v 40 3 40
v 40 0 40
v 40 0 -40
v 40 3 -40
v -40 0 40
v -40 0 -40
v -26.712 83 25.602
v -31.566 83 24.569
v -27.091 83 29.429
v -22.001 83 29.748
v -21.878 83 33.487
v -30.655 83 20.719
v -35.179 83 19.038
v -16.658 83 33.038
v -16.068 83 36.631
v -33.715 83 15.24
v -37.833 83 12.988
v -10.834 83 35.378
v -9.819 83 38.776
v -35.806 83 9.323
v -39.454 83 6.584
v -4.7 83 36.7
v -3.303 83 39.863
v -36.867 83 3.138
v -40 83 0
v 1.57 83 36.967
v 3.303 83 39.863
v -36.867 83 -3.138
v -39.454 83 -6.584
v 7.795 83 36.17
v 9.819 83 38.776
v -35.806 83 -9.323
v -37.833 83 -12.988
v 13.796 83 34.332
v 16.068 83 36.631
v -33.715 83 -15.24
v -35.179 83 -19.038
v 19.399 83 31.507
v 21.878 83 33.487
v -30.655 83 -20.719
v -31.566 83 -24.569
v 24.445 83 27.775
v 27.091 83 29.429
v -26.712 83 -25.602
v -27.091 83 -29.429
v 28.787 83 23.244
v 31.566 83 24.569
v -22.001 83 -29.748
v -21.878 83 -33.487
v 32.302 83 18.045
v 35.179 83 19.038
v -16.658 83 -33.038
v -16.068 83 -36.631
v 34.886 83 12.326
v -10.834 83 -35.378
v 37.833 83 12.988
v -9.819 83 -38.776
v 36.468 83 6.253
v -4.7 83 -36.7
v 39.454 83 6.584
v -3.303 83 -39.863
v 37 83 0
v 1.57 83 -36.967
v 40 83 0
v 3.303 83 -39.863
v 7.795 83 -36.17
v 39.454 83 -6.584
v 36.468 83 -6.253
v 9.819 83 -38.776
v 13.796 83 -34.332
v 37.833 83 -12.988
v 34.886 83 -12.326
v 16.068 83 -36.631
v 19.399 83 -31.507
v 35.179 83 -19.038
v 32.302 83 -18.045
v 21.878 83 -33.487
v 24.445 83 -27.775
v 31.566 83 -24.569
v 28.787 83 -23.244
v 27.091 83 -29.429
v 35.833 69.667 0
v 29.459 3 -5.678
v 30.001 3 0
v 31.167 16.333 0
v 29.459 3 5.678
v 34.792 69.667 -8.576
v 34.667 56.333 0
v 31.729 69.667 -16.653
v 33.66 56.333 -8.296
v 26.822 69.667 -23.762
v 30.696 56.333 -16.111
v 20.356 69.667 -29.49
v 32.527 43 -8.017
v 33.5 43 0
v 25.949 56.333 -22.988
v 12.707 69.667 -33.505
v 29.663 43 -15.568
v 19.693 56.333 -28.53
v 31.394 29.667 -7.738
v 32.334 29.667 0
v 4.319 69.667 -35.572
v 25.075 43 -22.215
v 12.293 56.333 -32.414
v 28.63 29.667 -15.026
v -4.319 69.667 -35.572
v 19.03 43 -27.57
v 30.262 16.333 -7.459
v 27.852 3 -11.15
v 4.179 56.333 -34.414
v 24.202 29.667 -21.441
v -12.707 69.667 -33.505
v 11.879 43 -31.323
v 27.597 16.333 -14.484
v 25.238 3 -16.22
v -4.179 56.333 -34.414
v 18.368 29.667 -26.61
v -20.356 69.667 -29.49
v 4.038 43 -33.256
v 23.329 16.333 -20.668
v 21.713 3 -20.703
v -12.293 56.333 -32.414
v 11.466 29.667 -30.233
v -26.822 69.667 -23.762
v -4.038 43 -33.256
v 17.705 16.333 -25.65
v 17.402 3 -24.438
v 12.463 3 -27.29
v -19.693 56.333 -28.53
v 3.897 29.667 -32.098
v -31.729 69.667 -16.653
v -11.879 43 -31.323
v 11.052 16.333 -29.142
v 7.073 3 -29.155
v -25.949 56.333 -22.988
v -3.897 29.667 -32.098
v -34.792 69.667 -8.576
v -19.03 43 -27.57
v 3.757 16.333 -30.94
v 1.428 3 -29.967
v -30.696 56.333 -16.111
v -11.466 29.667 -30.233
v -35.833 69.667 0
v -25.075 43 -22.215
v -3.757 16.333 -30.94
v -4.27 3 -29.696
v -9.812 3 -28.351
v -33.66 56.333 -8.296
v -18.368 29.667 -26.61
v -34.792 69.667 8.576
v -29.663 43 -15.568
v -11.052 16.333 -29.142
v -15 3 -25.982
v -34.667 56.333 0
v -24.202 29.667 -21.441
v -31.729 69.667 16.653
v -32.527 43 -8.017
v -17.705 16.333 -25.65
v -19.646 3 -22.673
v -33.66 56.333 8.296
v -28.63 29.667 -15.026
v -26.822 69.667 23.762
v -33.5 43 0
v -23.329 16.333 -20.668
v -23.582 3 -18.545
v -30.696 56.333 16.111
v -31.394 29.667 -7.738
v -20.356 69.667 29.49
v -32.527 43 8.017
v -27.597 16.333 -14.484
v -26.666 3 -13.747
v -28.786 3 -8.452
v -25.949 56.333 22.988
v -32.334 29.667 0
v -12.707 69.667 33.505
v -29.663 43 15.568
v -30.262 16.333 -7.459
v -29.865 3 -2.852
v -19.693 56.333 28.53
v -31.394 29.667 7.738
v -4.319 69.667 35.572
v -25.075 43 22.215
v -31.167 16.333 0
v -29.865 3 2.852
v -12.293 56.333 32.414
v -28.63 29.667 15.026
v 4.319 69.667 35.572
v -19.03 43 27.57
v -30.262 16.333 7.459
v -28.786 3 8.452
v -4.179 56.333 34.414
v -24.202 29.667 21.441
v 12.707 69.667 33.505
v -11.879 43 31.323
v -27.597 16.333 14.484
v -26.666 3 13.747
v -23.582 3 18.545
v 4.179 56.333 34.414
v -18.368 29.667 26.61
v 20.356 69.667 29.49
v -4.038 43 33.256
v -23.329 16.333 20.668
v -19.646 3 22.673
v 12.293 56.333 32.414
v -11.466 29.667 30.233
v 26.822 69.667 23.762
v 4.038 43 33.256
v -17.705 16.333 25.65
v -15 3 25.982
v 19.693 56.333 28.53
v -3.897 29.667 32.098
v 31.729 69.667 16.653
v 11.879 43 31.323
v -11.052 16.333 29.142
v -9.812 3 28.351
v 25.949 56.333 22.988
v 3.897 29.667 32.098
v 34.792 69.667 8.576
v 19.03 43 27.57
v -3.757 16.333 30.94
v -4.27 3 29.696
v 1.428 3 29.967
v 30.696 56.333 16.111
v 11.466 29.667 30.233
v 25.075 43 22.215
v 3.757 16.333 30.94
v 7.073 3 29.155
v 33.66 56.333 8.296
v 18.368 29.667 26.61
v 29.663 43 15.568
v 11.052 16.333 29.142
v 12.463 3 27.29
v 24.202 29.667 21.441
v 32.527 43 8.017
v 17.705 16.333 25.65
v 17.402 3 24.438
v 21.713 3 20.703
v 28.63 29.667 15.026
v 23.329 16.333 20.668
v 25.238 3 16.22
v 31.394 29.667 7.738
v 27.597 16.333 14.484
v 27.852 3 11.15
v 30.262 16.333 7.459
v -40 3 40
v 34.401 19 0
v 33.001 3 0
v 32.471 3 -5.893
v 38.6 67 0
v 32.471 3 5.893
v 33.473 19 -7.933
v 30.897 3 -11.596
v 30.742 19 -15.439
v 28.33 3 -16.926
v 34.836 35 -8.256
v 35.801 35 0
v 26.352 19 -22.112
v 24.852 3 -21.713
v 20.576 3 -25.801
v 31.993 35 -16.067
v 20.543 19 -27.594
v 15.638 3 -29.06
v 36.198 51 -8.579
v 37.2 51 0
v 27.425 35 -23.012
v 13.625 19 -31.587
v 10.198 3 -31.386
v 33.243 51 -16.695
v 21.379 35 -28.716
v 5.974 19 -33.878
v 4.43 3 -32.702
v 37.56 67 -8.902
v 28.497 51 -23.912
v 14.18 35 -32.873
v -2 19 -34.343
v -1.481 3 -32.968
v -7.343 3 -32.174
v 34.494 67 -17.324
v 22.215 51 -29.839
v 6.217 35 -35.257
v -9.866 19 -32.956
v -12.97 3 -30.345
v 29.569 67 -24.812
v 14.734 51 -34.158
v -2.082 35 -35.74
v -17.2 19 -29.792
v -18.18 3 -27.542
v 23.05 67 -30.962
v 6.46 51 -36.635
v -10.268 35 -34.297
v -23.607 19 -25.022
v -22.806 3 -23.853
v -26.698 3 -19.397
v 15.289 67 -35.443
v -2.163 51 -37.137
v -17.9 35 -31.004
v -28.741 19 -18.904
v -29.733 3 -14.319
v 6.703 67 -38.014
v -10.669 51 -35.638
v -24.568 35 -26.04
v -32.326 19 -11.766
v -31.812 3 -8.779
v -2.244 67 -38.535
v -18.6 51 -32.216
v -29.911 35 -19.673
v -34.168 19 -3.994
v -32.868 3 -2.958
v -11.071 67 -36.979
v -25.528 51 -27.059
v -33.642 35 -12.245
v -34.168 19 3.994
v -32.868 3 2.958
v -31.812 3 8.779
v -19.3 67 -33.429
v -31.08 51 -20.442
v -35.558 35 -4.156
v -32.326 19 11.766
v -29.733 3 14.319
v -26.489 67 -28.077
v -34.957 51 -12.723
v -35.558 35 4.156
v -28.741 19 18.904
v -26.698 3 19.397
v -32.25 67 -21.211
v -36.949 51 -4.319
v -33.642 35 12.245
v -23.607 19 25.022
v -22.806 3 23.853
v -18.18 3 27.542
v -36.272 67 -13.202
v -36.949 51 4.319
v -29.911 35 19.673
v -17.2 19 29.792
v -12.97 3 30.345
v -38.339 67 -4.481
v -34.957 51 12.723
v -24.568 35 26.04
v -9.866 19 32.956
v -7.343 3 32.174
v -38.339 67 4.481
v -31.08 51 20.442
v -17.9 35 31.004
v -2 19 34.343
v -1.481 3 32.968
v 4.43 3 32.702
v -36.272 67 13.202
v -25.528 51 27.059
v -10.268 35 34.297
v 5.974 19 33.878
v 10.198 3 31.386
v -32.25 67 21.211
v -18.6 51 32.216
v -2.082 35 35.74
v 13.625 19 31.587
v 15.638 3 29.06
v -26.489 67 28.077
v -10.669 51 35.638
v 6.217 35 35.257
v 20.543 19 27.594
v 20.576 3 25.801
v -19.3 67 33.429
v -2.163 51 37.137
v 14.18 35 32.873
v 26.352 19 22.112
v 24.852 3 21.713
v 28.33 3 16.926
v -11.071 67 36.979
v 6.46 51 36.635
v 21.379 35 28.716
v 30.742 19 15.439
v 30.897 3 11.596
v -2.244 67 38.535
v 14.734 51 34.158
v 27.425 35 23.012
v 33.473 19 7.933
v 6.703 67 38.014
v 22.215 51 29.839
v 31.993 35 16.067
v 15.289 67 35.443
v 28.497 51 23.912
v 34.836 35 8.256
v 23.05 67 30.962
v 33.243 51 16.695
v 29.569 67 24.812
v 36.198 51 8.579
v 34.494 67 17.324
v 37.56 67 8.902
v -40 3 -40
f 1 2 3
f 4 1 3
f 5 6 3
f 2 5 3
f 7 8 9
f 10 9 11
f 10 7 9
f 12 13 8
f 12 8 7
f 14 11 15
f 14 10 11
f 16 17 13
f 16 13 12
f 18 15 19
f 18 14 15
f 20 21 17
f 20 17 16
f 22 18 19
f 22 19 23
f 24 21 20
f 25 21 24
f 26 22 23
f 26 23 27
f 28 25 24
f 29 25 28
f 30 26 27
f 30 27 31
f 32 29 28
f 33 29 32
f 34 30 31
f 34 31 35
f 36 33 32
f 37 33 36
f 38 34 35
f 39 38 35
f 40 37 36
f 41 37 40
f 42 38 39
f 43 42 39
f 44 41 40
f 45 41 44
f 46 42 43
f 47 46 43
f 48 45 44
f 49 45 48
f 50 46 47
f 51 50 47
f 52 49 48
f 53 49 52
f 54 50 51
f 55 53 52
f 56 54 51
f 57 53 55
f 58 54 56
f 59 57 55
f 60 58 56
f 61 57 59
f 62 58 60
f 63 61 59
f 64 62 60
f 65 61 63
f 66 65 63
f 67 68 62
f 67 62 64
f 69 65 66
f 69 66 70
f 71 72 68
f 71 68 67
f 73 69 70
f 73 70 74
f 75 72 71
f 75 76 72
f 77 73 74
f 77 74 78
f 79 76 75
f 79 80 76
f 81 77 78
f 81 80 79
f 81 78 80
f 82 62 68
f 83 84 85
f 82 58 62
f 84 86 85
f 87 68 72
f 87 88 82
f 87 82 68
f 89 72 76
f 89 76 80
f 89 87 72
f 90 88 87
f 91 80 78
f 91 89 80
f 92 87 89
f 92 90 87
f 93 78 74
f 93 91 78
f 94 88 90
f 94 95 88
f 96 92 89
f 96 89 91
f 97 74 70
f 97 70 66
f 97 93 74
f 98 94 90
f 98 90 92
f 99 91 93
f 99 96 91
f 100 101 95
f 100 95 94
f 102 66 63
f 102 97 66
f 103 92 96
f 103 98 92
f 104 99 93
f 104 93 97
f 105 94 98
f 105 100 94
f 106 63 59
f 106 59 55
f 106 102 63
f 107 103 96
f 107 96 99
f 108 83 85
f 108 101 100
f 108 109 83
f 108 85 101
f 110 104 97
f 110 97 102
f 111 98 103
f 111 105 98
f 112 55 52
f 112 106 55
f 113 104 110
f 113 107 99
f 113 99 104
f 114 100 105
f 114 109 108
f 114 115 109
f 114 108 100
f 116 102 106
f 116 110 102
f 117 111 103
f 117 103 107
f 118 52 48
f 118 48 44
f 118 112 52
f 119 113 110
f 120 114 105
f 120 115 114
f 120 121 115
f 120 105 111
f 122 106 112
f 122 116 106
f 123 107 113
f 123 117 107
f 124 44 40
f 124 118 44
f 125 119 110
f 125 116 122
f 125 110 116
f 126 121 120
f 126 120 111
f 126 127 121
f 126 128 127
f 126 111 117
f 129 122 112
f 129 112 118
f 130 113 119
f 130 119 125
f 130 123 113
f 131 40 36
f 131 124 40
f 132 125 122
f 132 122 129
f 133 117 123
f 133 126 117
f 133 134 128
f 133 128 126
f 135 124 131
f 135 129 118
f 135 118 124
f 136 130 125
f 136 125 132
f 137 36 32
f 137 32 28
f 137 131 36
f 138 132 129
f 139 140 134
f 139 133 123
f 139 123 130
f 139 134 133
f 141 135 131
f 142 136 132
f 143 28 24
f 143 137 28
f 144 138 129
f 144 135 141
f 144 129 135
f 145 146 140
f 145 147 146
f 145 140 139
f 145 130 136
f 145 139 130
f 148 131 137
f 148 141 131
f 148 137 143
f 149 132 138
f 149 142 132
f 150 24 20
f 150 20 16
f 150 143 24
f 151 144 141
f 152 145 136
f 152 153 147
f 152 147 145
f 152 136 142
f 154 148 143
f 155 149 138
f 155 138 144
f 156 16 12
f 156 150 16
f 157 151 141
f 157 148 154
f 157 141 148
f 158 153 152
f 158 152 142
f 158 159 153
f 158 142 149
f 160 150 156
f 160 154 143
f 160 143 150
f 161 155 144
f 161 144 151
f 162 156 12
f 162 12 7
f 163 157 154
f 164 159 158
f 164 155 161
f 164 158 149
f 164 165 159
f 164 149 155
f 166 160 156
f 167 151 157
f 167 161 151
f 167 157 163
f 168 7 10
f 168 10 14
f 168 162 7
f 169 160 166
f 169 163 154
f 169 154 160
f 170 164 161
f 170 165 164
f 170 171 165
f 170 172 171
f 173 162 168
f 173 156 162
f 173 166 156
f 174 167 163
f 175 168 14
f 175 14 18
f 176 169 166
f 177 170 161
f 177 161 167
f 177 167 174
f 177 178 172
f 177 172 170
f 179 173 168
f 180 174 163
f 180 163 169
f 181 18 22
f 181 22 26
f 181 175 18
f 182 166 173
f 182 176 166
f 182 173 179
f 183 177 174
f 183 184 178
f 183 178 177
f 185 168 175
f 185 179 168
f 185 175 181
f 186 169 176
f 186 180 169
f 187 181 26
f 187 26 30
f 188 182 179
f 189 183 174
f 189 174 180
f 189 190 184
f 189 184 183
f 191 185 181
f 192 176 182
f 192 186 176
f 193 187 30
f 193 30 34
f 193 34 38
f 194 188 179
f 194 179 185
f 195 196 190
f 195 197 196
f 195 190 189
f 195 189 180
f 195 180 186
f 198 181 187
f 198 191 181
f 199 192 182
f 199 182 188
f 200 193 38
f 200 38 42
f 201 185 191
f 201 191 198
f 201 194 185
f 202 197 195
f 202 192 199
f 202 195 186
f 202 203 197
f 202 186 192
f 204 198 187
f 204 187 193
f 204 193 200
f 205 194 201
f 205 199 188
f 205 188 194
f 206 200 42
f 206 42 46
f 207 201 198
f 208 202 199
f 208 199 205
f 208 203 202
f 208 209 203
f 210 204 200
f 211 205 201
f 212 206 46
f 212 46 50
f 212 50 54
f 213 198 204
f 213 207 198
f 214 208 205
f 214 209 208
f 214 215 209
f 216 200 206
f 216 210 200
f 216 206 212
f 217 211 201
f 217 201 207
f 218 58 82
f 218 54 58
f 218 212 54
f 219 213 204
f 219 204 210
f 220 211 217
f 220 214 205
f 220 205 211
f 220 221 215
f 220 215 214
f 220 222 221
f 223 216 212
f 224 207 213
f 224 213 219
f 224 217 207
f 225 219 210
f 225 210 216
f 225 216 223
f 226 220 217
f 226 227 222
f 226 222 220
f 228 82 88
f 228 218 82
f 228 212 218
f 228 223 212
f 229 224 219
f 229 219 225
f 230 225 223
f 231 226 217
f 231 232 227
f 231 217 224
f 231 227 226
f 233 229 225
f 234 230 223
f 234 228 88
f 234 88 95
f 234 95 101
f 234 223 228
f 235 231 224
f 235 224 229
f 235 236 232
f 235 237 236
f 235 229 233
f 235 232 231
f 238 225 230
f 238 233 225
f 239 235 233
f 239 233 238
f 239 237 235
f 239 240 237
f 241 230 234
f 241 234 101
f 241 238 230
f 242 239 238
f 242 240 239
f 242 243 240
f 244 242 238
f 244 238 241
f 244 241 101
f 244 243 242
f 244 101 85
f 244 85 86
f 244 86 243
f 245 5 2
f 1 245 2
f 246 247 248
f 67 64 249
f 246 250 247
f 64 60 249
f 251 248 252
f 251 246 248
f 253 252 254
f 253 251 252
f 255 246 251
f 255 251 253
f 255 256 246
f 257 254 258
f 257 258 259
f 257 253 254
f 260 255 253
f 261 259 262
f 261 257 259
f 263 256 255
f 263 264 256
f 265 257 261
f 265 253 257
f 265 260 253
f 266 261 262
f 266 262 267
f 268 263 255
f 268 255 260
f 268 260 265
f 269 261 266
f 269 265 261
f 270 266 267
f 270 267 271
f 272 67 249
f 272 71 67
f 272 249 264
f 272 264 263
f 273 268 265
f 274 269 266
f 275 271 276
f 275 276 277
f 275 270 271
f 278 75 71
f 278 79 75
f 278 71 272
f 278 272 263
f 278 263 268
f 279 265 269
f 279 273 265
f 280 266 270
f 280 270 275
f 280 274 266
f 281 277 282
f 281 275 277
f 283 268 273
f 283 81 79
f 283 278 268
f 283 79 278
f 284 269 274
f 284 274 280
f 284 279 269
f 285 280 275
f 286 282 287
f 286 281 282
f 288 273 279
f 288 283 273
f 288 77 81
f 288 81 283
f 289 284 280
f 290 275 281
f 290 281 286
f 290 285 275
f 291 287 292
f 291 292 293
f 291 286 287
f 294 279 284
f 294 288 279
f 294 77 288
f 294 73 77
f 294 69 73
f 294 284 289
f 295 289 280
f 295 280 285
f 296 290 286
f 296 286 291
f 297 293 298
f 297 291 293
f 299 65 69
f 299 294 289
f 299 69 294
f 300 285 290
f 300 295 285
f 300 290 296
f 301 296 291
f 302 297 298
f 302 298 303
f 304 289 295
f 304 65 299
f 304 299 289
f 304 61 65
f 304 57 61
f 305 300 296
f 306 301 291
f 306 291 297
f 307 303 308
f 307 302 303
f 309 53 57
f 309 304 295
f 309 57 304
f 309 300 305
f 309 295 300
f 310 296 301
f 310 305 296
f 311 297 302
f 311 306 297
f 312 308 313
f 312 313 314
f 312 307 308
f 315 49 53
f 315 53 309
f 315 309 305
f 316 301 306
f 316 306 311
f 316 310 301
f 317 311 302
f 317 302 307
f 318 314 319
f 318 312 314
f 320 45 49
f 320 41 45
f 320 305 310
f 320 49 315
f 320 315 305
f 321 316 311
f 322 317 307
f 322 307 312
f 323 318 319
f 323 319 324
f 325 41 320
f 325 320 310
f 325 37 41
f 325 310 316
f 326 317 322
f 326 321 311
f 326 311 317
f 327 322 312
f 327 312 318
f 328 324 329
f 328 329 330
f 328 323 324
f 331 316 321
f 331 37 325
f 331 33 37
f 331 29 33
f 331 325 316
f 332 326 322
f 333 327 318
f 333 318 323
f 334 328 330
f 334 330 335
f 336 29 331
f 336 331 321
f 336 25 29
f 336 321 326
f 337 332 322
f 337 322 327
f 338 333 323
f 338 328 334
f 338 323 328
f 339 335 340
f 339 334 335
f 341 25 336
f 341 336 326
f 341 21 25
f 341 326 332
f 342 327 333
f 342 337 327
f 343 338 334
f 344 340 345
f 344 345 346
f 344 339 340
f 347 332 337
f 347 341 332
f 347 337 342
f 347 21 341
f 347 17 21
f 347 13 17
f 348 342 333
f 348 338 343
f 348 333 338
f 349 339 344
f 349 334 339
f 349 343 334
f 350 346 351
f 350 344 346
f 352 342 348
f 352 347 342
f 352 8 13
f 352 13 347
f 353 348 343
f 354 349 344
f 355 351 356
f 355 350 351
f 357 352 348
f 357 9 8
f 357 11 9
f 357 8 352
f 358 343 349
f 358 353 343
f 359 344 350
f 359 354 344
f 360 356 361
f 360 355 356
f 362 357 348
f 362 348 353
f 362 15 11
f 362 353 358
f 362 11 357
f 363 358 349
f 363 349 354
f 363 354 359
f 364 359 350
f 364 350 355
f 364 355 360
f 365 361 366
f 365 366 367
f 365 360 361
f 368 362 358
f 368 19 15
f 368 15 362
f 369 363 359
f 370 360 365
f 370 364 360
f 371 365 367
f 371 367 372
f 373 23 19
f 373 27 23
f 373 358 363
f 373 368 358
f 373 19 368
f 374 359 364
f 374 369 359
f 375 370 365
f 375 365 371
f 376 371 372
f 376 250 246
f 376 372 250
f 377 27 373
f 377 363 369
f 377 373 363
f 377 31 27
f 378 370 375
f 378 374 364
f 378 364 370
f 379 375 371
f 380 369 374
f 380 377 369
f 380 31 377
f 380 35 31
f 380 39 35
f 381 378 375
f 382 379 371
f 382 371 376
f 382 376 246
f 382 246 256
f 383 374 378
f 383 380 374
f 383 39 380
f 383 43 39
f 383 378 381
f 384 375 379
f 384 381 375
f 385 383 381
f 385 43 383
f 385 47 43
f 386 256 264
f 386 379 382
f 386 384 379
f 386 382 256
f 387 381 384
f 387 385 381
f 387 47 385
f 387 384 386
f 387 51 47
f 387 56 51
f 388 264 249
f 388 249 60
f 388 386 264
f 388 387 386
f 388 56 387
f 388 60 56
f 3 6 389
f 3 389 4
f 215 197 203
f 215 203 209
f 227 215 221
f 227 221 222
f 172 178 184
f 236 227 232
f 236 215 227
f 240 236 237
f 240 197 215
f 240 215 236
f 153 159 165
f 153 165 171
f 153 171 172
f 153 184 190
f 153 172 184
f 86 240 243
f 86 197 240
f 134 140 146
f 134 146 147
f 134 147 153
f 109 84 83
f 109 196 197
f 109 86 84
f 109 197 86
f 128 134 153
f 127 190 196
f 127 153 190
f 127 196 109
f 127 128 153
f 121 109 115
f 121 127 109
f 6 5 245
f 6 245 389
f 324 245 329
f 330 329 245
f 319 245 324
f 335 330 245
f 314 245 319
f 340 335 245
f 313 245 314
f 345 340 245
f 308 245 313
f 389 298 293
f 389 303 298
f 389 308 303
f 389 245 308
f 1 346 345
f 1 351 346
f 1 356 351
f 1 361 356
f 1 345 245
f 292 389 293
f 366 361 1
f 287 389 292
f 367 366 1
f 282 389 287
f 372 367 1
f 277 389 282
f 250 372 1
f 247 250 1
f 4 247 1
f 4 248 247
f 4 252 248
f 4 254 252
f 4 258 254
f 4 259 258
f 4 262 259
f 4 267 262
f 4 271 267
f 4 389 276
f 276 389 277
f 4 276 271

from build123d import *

# Parameters (mm, degrees)
ESQUISSE3_W        = 80
ESQUISSE3_H        = 80
BOSS_EXTRU_1_DEPTH = 3


with BuildPart() as part:
    # Esquisse3 → Boss.-Extru.1 (new body)
    with BuildSketch(Plane(origin=(0, 0, 0), x_dir=(1, 0, 0), z_dir=(0, 1, 0))):
        Rectangle(ESQUISSE3_W, ESQUISSE3_H)
    extrude(amount=BOSS_EXTRU_1_DEPTH)

    # Esquisse4 → Révolution1 (revolve)
    with BuildSketch(Plane.XY):
        Polygon((33.000906918, 3), (40, 83), (37, 83), (30.000906918, 3), align=None)
    revolve(axis=Axis((0, 5.327964133, 0), (0, 1, 0)))


solid = part.part
